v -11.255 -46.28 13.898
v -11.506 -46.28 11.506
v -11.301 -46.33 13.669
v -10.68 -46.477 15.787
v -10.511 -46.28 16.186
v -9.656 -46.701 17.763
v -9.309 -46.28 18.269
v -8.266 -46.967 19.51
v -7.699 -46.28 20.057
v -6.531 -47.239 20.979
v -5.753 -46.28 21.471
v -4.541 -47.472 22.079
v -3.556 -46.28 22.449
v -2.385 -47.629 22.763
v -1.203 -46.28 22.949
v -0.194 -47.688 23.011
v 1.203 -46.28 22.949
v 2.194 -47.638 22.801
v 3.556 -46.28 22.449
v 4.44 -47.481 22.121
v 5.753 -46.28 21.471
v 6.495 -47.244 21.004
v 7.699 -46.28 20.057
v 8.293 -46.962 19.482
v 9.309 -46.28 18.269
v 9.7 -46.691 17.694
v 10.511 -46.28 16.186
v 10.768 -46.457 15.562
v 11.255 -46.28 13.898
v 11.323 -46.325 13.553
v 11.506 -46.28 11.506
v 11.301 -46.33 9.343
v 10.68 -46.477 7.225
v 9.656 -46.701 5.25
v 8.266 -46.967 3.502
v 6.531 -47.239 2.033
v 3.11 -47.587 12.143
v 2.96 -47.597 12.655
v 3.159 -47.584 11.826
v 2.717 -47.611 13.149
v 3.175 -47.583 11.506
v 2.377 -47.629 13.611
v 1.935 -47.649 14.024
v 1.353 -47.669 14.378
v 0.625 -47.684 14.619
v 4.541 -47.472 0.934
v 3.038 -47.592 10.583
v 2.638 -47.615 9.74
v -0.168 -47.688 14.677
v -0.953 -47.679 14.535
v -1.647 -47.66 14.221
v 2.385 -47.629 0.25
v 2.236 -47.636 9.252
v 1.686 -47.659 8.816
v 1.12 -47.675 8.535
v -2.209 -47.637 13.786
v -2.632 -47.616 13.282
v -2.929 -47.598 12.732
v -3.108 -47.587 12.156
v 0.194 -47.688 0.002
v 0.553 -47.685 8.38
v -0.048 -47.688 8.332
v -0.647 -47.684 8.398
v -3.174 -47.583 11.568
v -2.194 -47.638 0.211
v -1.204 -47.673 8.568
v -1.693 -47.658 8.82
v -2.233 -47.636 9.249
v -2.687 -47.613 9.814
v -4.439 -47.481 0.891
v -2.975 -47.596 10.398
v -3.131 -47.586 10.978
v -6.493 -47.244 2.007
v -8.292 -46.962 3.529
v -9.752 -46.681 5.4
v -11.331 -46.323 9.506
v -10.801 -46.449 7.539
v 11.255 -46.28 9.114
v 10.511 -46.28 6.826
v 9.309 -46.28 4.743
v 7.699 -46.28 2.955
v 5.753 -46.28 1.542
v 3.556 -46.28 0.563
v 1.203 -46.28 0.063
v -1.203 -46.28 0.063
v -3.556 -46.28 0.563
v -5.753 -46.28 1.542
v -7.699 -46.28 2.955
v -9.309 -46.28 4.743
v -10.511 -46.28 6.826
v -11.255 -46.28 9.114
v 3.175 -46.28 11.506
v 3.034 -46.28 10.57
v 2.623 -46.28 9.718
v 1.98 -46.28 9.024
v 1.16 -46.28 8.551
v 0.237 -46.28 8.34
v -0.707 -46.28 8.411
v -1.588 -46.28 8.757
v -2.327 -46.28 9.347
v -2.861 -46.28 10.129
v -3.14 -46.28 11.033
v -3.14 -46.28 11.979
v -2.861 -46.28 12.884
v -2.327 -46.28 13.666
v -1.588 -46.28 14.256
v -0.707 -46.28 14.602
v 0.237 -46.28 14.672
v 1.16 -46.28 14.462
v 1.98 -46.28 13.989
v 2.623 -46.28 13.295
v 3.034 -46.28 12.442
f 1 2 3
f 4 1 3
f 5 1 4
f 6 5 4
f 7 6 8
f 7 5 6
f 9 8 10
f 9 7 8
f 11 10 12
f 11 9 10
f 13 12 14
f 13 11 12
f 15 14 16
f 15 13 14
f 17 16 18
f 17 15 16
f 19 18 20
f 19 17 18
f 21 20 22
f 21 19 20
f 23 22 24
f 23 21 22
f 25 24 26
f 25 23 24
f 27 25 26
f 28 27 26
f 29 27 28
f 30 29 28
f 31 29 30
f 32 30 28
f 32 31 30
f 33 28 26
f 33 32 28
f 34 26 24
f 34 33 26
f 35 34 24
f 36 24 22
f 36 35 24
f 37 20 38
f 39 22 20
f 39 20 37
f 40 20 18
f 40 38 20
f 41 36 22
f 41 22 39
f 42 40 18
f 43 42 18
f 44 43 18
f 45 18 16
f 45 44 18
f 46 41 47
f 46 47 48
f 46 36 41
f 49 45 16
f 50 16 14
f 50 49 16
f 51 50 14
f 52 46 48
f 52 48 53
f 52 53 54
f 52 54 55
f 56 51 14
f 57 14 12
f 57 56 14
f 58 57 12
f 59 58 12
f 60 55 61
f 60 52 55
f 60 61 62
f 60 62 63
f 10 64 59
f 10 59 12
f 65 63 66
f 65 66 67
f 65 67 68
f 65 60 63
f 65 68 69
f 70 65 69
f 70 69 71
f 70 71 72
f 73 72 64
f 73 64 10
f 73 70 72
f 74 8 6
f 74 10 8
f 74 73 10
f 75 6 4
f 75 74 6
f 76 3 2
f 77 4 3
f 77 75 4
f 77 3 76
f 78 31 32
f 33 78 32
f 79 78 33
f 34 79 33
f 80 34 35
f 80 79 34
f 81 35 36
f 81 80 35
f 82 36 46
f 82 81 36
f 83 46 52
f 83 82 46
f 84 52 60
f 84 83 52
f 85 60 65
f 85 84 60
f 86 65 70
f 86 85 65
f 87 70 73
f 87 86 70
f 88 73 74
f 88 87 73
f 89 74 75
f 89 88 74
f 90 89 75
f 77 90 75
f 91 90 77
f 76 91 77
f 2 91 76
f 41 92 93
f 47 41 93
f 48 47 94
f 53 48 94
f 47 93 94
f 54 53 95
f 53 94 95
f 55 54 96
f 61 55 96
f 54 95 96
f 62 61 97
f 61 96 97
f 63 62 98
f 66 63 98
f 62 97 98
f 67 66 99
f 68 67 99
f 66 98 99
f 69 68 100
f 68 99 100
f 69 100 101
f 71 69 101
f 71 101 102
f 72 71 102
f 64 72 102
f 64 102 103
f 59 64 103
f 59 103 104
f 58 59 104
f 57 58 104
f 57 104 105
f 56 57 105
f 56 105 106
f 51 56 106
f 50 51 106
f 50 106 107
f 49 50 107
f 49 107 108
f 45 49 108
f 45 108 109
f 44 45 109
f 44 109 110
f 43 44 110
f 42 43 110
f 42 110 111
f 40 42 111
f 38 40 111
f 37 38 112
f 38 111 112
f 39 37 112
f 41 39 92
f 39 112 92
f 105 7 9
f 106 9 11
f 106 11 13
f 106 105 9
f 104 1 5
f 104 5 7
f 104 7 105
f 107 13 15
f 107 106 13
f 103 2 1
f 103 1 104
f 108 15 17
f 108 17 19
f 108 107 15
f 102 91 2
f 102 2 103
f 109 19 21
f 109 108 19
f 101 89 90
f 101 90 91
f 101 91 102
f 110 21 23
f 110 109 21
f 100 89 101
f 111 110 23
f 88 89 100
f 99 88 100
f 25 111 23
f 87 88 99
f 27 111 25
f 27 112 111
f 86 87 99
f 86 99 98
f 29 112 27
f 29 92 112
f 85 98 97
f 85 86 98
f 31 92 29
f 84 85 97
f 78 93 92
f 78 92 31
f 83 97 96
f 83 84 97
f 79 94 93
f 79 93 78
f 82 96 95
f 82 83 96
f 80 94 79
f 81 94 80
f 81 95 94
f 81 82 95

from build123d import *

# Parameters (mm, degrees)
BOSS_EXTRUDE1_DEPTH = 23.0124
SKETCH2_W           = 44.611940252
SKETCH2_H           = 41.110401543
SKETCH2_R           = 11.5062
CUT_EXTRUDE3_DEPTH  = 2.54
SKETCH3_R           = 3.175
CUT_EXTRUDE4_DEPTH  = 2.408910713


with BuildPart() as part:
    # Sketch1 → Boss-Extrude1 (new body)
    with BuildSketch(Plane.XY):
        with BuildLine():
            Line((-11.5062, -46.279589387), (11.5062, -46.279589387))
            ThreePointArc((11.5062, -46.279589387), (0, -47.6885), (-11.5062, -46.279589387))
        make_face()
    extrude(amount=BOSS_EXTRUDE1_DEPTH)

    # Sketch2 → Cut-Extrude3 (cut)
    with BuildSketch(Plane(origin=(0, -46.279589387, 0), x_dir=(1, 0, 0), z_dir=(0, 1, 0))):
        with Locations((2.111795661, -11.044209065)):
            Rectangle(SKETCH2_W, SKETCH2_H)
        with Locations((0, -11.5062)):
            Circle(SKETCH2_R, mode=Mode.SUBTRACT)
    extrude(amount=-CUT_EXTRUDE3_DEPTH, mode=Mode.SUBTRACT)

    # Sketch3 → Cut-Extrude4 (cut, through all)
    with BuildSketch(Plane(origin=(0, -46.279589387, 0), x_dir=(1, 0, 0), z_dir=(0, 1, 0))):
        with Locations((0, -11.5062)):
            Circle(SKETCH3_R)
    extrude(amount=-CUT_EXTRUDE4_DEPTH, mode=Mode.SUBTRACT)


solid = part.part
